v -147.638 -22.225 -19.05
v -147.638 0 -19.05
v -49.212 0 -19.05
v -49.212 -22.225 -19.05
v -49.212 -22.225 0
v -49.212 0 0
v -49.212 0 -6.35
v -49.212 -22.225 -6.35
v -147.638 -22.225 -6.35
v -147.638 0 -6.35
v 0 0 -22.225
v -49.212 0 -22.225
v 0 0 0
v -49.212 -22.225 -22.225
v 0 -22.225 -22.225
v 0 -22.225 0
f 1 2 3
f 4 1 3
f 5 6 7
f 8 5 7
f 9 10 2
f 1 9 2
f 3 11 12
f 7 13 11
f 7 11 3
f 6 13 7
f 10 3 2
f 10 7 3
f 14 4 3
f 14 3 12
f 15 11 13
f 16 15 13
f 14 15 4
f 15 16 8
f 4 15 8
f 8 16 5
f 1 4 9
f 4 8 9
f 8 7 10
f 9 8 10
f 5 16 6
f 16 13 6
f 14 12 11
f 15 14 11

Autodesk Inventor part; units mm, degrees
ref_plane "YZ Plane" through (0, 0, 0) normal (1, 0, 0) x (0, 1, 0)
ref_plane "XZ Plane" through (0, 0, 0) normal (0, 1, 0) x (-1, 0, 0)
ref_plane "XY Plane" through (0, 0, 0) normal (0, 0, 1) x (1, 0, 0)
sketch "Sketch1" plane through (0, 0, 0) normal (0, 1, 0) x (-1, 0, 0)
  line L0 (0, 0) -> (49.2125, 0)
  line L1 (49.2125, 0) -> (49.2125, -6.35)
  line L2 (49.2125, -6.35) -> (147.6375, -6.35)
  line L3 (147.6375, -6.35) -> (147.6375, -19.05)
  line L4 (147.6375, -19.05) -> (49.2125, -19.05)
  line L5 (49.2125, -19.05) -> (49.2125, -22.225)
  line L6 (49.2125, -22.225) -> (0, -22.225)
  line L7 (0, -22.225) -> (0, 0)
  dimension "d0" = 22.225
  dimension "d1" = 147.6375
  dimension "d2" = 98.425
  dimension "d4" = 19.05
  dimension "d5" = 15.875
extrude "Extrusion1" add sketch "Sketch1" against normal blind 22.225
properties part number "Key--A"
